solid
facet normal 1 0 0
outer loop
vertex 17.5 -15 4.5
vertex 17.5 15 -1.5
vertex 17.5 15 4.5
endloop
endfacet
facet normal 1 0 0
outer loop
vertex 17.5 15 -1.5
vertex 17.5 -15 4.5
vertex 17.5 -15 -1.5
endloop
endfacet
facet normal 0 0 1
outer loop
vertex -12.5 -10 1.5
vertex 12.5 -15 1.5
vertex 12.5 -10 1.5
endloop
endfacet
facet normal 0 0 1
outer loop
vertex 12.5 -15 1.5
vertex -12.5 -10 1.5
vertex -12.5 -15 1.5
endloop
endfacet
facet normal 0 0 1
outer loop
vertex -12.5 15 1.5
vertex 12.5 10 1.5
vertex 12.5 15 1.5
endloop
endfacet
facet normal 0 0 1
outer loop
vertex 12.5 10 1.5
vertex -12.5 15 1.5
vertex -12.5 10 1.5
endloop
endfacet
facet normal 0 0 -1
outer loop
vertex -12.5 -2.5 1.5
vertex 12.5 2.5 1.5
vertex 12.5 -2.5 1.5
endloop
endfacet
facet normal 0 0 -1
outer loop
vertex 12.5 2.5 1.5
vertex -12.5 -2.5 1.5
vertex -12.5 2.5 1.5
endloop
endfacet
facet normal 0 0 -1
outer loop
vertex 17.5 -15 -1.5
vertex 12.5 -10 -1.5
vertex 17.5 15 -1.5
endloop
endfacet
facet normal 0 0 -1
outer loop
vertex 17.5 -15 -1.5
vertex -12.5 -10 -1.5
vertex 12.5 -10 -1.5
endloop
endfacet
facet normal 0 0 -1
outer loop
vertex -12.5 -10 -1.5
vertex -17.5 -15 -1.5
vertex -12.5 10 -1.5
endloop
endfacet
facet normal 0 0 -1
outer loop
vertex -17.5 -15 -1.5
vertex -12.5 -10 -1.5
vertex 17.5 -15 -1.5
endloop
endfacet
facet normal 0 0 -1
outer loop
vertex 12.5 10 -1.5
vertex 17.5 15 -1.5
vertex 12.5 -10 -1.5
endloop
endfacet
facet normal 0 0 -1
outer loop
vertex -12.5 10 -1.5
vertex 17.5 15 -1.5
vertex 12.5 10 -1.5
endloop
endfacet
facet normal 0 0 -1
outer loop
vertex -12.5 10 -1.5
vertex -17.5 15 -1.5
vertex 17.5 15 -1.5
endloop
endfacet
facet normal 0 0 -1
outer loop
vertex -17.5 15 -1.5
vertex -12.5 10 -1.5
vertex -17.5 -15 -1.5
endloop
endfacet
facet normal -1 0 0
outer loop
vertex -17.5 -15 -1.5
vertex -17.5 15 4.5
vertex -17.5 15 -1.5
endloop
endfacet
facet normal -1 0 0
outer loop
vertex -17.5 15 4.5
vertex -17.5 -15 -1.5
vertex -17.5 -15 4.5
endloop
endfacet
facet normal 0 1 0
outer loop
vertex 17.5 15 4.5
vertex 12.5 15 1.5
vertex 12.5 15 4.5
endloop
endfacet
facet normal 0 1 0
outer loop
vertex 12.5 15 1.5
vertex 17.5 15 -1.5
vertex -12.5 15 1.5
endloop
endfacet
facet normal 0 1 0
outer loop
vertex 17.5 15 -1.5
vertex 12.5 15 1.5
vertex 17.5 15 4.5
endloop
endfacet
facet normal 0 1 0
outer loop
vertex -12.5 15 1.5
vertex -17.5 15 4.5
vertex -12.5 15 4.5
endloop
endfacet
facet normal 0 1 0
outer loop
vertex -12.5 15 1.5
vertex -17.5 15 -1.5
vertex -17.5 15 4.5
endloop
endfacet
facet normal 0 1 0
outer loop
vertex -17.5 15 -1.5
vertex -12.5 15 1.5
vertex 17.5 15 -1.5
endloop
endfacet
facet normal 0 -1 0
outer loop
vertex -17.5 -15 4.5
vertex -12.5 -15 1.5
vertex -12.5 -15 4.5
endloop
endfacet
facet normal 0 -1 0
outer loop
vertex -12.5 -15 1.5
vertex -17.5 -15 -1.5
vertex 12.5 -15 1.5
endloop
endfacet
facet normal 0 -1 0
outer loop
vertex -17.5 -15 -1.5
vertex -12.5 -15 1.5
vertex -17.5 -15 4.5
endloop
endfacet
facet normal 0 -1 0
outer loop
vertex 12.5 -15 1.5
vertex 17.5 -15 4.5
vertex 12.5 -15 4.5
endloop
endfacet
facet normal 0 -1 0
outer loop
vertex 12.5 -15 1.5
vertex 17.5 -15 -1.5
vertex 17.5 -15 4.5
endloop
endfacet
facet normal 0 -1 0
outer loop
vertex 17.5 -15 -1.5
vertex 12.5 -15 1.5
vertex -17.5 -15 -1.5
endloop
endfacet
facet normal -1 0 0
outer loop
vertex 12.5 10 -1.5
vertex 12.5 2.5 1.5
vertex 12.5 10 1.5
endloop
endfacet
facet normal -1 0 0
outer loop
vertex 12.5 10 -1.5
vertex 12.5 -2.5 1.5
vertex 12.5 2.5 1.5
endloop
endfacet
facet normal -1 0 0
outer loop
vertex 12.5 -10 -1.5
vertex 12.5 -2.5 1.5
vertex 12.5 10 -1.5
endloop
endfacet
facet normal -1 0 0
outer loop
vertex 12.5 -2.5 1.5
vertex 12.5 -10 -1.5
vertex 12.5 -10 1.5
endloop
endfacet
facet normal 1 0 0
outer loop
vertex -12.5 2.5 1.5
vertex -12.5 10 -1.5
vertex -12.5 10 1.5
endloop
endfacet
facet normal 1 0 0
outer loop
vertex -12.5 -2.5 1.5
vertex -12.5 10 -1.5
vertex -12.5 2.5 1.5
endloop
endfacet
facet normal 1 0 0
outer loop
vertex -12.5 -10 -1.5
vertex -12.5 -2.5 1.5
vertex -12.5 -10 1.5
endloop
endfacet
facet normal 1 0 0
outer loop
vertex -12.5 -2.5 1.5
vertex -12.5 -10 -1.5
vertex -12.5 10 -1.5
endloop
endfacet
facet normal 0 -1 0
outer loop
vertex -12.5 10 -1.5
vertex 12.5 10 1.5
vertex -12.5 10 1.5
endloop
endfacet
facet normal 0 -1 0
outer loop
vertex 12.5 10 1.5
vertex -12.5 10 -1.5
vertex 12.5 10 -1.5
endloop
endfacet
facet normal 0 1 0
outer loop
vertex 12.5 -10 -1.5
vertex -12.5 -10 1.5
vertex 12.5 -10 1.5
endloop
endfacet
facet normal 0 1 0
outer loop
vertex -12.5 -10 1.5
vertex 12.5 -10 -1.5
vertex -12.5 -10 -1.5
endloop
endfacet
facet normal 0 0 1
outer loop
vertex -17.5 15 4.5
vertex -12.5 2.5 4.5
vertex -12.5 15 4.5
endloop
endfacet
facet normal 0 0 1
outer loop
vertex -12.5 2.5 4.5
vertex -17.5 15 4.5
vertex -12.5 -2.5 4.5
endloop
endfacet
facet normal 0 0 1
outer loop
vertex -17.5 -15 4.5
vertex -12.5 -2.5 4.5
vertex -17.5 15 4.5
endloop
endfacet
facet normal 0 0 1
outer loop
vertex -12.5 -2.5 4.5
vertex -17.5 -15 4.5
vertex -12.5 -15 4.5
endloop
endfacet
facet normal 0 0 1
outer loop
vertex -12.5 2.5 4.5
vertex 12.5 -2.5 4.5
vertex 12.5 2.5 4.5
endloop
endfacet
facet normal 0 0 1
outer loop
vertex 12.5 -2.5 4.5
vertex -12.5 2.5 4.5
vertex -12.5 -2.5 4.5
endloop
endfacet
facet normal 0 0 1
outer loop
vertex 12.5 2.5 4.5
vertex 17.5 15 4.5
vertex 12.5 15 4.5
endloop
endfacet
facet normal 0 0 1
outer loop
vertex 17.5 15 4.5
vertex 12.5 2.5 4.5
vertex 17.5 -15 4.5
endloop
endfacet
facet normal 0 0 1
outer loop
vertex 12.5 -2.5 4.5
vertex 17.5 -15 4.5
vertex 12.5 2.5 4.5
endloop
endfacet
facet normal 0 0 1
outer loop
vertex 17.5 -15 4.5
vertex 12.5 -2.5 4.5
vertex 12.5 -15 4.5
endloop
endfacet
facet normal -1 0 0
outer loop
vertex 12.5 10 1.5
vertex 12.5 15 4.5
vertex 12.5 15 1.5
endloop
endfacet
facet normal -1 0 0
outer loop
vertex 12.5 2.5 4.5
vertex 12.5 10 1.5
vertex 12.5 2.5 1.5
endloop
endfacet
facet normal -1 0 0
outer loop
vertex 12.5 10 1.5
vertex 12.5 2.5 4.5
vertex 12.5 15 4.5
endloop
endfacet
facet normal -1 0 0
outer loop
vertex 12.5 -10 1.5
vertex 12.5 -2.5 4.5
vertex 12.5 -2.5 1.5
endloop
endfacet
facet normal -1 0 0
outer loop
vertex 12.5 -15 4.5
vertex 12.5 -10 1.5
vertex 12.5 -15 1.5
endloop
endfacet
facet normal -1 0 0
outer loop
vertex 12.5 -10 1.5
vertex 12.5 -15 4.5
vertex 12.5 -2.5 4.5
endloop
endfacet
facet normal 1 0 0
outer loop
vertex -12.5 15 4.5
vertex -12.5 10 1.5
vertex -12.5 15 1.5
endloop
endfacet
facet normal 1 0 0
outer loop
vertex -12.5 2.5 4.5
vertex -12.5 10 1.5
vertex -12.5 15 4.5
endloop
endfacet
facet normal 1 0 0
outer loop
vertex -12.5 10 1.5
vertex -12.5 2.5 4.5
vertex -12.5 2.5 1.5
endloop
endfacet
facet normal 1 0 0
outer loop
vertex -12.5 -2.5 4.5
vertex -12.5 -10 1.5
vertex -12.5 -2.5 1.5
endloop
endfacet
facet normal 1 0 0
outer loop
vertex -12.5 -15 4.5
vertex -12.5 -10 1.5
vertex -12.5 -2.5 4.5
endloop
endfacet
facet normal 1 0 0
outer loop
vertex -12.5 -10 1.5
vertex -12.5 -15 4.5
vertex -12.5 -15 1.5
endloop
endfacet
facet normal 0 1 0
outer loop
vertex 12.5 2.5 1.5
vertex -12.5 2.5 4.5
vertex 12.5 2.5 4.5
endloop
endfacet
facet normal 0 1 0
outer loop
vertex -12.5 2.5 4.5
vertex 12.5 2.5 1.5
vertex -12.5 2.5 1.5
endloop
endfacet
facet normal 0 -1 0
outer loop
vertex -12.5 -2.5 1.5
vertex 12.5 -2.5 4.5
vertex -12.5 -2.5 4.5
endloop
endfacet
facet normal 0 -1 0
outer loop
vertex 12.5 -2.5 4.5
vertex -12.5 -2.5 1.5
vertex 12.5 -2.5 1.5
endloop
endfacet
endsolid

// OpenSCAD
difference() {
  cube([35, 30, 3], center=true);
  cube([25, 20, 4], center=true);
}

translate([15, 0, 3])
cube([5, 30, 3], center=true);

translate([-15, 0, 3])
cube([5, 30, 3], center=true);

translate([0, 0, 3])
cube([35, 5, 3], center=true);
